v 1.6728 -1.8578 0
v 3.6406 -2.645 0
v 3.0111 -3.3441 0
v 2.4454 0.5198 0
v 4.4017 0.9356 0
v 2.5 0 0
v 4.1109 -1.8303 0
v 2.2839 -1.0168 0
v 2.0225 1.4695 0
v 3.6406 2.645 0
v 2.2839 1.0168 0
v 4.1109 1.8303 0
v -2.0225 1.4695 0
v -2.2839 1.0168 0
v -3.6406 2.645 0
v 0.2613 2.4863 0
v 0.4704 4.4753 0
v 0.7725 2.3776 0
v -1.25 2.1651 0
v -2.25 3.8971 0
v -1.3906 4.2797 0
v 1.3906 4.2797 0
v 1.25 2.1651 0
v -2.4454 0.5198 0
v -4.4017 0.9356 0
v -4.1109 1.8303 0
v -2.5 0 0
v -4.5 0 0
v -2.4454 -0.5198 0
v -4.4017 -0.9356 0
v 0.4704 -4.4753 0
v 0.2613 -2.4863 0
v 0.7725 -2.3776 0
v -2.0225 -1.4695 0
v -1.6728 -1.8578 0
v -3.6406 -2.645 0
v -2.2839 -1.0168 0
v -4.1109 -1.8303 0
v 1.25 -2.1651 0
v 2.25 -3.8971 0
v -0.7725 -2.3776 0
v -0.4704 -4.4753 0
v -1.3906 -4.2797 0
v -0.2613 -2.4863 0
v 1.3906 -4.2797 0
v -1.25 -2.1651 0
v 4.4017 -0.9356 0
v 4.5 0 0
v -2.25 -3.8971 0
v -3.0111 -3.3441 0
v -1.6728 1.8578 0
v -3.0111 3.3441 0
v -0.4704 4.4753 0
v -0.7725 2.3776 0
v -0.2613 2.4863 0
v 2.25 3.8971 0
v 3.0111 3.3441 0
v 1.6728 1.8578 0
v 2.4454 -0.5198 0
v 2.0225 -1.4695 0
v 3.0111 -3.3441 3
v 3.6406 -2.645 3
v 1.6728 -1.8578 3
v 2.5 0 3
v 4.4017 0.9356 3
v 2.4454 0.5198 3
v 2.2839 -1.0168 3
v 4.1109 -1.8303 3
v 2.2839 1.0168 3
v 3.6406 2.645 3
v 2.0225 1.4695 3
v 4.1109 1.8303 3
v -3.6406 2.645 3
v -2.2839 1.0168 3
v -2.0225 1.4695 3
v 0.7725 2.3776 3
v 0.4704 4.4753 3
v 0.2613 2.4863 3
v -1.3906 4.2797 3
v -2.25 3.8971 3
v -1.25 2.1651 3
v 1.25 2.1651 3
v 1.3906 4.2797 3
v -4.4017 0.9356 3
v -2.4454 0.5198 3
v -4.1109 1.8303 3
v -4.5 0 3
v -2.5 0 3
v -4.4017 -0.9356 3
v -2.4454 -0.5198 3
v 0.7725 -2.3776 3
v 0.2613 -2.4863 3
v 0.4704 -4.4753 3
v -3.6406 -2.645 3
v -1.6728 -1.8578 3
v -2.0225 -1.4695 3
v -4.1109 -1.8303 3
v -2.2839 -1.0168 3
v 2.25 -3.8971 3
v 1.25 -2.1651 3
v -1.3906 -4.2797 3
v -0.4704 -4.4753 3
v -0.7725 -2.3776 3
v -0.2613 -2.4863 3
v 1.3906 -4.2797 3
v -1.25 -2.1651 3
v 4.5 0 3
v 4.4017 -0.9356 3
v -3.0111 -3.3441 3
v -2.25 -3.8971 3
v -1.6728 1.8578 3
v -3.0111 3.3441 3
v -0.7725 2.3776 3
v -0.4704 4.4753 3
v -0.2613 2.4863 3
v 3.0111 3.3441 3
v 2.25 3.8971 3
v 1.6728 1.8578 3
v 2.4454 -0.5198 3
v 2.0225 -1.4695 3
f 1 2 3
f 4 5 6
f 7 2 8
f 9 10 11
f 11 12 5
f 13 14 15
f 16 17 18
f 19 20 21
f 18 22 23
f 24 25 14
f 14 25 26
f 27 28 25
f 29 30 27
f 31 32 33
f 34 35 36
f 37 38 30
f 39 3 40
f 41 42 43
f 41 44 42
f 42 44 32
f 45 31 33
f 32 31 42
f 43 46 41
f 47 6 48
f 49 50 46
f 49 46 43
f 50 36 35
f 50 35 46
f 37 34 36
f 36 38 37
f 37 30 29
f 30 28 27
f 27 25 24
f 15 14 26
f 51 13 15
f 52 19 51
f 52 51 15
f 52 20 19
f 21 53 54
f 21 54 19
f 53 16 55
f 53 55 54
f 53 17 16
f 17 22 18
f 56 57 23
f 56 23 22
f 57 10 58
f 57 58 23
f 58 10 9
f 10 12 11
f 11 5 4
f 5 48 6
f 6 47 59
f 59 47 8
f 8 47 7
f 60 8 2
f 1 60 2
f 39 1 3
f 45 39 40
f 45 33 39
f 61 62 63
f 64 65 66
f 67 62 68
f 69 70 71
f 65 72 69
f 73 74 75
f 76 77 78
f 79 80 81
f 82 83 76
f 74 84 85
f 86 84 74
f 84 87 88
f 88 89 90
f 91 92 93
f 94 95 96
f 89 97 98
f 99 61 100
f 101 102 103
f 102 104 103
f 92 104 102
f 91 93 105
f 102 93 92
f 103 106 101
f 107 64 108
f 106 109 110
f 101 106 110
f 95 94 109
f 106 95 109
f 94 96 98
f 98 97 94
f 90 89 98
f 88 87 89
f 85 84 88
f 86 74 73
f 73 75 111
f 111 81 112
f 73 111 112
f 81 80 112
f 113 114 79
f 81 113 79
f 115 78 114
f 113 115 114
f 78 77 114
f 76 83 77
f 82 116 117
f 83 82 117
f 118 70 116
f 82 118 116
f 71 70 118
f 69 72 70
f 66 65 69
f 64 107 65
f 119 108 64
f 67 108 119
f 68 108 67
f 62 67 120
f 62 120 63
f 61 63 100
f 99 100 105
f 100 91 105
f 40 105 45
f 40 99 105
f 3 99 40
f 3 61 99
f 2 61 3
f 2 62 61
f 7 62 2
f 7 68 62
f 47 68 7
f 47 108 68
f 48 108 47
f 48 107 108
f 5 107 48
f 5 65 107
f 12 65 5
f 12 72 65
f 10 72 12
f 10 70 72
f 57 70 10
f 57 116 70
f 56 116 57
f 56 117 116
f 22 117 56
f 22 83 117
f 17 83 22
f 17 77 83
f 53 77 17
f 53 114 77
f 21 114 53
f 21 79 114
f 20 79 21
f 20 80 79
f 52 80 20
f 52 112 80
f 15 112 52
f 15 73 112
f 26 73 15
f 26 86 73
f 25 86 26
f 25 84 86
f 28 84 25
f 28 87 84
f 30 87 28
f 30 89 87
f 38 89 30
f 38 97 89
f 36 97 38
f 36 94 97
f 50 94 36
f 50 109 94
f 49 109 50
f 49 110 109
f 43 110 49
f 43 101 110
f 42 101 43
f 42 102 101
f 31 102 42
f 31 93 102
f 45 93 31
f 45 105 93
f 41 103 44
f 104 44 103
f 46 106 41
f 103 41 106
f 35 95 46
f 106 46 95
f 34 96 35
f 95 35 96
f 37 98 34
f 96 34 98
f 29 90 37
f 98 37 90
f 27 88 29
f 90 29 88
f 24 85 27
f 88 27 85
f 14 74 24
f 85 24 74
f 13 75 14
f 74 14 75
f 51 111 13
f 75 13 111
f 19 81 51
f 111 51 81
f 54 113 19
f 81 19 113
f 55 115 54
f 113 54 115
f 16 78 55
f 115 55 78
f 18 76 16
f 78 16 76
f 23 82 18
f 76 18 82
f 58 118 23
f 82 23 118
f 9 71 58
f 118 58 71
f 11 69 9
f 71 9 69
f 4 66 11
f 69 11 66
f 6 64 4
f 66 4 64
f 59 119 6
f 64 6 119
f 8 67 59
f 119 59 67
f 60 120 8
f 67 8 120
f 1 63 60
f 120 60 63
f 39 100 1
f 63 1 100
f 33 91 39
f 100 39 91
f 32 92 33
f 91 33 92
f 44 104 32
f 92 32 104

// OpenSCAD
// Values taken from datasheet
// https://www.tme.eu/pl/details/tf9x3x5-b15/ferryty-pierscieniowe/ferrocore/t9x3x5-b15/
EXTERNAL_DIAMETER = 4.5;
INTERNAL_DIAMETER = 2.5;
FERRITE_HEIGHT    = 3.0;

// Increase steps in render to have quality circles
$fs=0.01;


module RFAmplifierTransformer() {
    linear_extrude(height = FERRITE_HEIGHT, convexity = 10, twist = 0)
        difference() {
            circle(EXTERNAL_DIAMETER);
            circle(INTERNAL_DIAMETER);
        }
}

RFAmplifierTransformer();
